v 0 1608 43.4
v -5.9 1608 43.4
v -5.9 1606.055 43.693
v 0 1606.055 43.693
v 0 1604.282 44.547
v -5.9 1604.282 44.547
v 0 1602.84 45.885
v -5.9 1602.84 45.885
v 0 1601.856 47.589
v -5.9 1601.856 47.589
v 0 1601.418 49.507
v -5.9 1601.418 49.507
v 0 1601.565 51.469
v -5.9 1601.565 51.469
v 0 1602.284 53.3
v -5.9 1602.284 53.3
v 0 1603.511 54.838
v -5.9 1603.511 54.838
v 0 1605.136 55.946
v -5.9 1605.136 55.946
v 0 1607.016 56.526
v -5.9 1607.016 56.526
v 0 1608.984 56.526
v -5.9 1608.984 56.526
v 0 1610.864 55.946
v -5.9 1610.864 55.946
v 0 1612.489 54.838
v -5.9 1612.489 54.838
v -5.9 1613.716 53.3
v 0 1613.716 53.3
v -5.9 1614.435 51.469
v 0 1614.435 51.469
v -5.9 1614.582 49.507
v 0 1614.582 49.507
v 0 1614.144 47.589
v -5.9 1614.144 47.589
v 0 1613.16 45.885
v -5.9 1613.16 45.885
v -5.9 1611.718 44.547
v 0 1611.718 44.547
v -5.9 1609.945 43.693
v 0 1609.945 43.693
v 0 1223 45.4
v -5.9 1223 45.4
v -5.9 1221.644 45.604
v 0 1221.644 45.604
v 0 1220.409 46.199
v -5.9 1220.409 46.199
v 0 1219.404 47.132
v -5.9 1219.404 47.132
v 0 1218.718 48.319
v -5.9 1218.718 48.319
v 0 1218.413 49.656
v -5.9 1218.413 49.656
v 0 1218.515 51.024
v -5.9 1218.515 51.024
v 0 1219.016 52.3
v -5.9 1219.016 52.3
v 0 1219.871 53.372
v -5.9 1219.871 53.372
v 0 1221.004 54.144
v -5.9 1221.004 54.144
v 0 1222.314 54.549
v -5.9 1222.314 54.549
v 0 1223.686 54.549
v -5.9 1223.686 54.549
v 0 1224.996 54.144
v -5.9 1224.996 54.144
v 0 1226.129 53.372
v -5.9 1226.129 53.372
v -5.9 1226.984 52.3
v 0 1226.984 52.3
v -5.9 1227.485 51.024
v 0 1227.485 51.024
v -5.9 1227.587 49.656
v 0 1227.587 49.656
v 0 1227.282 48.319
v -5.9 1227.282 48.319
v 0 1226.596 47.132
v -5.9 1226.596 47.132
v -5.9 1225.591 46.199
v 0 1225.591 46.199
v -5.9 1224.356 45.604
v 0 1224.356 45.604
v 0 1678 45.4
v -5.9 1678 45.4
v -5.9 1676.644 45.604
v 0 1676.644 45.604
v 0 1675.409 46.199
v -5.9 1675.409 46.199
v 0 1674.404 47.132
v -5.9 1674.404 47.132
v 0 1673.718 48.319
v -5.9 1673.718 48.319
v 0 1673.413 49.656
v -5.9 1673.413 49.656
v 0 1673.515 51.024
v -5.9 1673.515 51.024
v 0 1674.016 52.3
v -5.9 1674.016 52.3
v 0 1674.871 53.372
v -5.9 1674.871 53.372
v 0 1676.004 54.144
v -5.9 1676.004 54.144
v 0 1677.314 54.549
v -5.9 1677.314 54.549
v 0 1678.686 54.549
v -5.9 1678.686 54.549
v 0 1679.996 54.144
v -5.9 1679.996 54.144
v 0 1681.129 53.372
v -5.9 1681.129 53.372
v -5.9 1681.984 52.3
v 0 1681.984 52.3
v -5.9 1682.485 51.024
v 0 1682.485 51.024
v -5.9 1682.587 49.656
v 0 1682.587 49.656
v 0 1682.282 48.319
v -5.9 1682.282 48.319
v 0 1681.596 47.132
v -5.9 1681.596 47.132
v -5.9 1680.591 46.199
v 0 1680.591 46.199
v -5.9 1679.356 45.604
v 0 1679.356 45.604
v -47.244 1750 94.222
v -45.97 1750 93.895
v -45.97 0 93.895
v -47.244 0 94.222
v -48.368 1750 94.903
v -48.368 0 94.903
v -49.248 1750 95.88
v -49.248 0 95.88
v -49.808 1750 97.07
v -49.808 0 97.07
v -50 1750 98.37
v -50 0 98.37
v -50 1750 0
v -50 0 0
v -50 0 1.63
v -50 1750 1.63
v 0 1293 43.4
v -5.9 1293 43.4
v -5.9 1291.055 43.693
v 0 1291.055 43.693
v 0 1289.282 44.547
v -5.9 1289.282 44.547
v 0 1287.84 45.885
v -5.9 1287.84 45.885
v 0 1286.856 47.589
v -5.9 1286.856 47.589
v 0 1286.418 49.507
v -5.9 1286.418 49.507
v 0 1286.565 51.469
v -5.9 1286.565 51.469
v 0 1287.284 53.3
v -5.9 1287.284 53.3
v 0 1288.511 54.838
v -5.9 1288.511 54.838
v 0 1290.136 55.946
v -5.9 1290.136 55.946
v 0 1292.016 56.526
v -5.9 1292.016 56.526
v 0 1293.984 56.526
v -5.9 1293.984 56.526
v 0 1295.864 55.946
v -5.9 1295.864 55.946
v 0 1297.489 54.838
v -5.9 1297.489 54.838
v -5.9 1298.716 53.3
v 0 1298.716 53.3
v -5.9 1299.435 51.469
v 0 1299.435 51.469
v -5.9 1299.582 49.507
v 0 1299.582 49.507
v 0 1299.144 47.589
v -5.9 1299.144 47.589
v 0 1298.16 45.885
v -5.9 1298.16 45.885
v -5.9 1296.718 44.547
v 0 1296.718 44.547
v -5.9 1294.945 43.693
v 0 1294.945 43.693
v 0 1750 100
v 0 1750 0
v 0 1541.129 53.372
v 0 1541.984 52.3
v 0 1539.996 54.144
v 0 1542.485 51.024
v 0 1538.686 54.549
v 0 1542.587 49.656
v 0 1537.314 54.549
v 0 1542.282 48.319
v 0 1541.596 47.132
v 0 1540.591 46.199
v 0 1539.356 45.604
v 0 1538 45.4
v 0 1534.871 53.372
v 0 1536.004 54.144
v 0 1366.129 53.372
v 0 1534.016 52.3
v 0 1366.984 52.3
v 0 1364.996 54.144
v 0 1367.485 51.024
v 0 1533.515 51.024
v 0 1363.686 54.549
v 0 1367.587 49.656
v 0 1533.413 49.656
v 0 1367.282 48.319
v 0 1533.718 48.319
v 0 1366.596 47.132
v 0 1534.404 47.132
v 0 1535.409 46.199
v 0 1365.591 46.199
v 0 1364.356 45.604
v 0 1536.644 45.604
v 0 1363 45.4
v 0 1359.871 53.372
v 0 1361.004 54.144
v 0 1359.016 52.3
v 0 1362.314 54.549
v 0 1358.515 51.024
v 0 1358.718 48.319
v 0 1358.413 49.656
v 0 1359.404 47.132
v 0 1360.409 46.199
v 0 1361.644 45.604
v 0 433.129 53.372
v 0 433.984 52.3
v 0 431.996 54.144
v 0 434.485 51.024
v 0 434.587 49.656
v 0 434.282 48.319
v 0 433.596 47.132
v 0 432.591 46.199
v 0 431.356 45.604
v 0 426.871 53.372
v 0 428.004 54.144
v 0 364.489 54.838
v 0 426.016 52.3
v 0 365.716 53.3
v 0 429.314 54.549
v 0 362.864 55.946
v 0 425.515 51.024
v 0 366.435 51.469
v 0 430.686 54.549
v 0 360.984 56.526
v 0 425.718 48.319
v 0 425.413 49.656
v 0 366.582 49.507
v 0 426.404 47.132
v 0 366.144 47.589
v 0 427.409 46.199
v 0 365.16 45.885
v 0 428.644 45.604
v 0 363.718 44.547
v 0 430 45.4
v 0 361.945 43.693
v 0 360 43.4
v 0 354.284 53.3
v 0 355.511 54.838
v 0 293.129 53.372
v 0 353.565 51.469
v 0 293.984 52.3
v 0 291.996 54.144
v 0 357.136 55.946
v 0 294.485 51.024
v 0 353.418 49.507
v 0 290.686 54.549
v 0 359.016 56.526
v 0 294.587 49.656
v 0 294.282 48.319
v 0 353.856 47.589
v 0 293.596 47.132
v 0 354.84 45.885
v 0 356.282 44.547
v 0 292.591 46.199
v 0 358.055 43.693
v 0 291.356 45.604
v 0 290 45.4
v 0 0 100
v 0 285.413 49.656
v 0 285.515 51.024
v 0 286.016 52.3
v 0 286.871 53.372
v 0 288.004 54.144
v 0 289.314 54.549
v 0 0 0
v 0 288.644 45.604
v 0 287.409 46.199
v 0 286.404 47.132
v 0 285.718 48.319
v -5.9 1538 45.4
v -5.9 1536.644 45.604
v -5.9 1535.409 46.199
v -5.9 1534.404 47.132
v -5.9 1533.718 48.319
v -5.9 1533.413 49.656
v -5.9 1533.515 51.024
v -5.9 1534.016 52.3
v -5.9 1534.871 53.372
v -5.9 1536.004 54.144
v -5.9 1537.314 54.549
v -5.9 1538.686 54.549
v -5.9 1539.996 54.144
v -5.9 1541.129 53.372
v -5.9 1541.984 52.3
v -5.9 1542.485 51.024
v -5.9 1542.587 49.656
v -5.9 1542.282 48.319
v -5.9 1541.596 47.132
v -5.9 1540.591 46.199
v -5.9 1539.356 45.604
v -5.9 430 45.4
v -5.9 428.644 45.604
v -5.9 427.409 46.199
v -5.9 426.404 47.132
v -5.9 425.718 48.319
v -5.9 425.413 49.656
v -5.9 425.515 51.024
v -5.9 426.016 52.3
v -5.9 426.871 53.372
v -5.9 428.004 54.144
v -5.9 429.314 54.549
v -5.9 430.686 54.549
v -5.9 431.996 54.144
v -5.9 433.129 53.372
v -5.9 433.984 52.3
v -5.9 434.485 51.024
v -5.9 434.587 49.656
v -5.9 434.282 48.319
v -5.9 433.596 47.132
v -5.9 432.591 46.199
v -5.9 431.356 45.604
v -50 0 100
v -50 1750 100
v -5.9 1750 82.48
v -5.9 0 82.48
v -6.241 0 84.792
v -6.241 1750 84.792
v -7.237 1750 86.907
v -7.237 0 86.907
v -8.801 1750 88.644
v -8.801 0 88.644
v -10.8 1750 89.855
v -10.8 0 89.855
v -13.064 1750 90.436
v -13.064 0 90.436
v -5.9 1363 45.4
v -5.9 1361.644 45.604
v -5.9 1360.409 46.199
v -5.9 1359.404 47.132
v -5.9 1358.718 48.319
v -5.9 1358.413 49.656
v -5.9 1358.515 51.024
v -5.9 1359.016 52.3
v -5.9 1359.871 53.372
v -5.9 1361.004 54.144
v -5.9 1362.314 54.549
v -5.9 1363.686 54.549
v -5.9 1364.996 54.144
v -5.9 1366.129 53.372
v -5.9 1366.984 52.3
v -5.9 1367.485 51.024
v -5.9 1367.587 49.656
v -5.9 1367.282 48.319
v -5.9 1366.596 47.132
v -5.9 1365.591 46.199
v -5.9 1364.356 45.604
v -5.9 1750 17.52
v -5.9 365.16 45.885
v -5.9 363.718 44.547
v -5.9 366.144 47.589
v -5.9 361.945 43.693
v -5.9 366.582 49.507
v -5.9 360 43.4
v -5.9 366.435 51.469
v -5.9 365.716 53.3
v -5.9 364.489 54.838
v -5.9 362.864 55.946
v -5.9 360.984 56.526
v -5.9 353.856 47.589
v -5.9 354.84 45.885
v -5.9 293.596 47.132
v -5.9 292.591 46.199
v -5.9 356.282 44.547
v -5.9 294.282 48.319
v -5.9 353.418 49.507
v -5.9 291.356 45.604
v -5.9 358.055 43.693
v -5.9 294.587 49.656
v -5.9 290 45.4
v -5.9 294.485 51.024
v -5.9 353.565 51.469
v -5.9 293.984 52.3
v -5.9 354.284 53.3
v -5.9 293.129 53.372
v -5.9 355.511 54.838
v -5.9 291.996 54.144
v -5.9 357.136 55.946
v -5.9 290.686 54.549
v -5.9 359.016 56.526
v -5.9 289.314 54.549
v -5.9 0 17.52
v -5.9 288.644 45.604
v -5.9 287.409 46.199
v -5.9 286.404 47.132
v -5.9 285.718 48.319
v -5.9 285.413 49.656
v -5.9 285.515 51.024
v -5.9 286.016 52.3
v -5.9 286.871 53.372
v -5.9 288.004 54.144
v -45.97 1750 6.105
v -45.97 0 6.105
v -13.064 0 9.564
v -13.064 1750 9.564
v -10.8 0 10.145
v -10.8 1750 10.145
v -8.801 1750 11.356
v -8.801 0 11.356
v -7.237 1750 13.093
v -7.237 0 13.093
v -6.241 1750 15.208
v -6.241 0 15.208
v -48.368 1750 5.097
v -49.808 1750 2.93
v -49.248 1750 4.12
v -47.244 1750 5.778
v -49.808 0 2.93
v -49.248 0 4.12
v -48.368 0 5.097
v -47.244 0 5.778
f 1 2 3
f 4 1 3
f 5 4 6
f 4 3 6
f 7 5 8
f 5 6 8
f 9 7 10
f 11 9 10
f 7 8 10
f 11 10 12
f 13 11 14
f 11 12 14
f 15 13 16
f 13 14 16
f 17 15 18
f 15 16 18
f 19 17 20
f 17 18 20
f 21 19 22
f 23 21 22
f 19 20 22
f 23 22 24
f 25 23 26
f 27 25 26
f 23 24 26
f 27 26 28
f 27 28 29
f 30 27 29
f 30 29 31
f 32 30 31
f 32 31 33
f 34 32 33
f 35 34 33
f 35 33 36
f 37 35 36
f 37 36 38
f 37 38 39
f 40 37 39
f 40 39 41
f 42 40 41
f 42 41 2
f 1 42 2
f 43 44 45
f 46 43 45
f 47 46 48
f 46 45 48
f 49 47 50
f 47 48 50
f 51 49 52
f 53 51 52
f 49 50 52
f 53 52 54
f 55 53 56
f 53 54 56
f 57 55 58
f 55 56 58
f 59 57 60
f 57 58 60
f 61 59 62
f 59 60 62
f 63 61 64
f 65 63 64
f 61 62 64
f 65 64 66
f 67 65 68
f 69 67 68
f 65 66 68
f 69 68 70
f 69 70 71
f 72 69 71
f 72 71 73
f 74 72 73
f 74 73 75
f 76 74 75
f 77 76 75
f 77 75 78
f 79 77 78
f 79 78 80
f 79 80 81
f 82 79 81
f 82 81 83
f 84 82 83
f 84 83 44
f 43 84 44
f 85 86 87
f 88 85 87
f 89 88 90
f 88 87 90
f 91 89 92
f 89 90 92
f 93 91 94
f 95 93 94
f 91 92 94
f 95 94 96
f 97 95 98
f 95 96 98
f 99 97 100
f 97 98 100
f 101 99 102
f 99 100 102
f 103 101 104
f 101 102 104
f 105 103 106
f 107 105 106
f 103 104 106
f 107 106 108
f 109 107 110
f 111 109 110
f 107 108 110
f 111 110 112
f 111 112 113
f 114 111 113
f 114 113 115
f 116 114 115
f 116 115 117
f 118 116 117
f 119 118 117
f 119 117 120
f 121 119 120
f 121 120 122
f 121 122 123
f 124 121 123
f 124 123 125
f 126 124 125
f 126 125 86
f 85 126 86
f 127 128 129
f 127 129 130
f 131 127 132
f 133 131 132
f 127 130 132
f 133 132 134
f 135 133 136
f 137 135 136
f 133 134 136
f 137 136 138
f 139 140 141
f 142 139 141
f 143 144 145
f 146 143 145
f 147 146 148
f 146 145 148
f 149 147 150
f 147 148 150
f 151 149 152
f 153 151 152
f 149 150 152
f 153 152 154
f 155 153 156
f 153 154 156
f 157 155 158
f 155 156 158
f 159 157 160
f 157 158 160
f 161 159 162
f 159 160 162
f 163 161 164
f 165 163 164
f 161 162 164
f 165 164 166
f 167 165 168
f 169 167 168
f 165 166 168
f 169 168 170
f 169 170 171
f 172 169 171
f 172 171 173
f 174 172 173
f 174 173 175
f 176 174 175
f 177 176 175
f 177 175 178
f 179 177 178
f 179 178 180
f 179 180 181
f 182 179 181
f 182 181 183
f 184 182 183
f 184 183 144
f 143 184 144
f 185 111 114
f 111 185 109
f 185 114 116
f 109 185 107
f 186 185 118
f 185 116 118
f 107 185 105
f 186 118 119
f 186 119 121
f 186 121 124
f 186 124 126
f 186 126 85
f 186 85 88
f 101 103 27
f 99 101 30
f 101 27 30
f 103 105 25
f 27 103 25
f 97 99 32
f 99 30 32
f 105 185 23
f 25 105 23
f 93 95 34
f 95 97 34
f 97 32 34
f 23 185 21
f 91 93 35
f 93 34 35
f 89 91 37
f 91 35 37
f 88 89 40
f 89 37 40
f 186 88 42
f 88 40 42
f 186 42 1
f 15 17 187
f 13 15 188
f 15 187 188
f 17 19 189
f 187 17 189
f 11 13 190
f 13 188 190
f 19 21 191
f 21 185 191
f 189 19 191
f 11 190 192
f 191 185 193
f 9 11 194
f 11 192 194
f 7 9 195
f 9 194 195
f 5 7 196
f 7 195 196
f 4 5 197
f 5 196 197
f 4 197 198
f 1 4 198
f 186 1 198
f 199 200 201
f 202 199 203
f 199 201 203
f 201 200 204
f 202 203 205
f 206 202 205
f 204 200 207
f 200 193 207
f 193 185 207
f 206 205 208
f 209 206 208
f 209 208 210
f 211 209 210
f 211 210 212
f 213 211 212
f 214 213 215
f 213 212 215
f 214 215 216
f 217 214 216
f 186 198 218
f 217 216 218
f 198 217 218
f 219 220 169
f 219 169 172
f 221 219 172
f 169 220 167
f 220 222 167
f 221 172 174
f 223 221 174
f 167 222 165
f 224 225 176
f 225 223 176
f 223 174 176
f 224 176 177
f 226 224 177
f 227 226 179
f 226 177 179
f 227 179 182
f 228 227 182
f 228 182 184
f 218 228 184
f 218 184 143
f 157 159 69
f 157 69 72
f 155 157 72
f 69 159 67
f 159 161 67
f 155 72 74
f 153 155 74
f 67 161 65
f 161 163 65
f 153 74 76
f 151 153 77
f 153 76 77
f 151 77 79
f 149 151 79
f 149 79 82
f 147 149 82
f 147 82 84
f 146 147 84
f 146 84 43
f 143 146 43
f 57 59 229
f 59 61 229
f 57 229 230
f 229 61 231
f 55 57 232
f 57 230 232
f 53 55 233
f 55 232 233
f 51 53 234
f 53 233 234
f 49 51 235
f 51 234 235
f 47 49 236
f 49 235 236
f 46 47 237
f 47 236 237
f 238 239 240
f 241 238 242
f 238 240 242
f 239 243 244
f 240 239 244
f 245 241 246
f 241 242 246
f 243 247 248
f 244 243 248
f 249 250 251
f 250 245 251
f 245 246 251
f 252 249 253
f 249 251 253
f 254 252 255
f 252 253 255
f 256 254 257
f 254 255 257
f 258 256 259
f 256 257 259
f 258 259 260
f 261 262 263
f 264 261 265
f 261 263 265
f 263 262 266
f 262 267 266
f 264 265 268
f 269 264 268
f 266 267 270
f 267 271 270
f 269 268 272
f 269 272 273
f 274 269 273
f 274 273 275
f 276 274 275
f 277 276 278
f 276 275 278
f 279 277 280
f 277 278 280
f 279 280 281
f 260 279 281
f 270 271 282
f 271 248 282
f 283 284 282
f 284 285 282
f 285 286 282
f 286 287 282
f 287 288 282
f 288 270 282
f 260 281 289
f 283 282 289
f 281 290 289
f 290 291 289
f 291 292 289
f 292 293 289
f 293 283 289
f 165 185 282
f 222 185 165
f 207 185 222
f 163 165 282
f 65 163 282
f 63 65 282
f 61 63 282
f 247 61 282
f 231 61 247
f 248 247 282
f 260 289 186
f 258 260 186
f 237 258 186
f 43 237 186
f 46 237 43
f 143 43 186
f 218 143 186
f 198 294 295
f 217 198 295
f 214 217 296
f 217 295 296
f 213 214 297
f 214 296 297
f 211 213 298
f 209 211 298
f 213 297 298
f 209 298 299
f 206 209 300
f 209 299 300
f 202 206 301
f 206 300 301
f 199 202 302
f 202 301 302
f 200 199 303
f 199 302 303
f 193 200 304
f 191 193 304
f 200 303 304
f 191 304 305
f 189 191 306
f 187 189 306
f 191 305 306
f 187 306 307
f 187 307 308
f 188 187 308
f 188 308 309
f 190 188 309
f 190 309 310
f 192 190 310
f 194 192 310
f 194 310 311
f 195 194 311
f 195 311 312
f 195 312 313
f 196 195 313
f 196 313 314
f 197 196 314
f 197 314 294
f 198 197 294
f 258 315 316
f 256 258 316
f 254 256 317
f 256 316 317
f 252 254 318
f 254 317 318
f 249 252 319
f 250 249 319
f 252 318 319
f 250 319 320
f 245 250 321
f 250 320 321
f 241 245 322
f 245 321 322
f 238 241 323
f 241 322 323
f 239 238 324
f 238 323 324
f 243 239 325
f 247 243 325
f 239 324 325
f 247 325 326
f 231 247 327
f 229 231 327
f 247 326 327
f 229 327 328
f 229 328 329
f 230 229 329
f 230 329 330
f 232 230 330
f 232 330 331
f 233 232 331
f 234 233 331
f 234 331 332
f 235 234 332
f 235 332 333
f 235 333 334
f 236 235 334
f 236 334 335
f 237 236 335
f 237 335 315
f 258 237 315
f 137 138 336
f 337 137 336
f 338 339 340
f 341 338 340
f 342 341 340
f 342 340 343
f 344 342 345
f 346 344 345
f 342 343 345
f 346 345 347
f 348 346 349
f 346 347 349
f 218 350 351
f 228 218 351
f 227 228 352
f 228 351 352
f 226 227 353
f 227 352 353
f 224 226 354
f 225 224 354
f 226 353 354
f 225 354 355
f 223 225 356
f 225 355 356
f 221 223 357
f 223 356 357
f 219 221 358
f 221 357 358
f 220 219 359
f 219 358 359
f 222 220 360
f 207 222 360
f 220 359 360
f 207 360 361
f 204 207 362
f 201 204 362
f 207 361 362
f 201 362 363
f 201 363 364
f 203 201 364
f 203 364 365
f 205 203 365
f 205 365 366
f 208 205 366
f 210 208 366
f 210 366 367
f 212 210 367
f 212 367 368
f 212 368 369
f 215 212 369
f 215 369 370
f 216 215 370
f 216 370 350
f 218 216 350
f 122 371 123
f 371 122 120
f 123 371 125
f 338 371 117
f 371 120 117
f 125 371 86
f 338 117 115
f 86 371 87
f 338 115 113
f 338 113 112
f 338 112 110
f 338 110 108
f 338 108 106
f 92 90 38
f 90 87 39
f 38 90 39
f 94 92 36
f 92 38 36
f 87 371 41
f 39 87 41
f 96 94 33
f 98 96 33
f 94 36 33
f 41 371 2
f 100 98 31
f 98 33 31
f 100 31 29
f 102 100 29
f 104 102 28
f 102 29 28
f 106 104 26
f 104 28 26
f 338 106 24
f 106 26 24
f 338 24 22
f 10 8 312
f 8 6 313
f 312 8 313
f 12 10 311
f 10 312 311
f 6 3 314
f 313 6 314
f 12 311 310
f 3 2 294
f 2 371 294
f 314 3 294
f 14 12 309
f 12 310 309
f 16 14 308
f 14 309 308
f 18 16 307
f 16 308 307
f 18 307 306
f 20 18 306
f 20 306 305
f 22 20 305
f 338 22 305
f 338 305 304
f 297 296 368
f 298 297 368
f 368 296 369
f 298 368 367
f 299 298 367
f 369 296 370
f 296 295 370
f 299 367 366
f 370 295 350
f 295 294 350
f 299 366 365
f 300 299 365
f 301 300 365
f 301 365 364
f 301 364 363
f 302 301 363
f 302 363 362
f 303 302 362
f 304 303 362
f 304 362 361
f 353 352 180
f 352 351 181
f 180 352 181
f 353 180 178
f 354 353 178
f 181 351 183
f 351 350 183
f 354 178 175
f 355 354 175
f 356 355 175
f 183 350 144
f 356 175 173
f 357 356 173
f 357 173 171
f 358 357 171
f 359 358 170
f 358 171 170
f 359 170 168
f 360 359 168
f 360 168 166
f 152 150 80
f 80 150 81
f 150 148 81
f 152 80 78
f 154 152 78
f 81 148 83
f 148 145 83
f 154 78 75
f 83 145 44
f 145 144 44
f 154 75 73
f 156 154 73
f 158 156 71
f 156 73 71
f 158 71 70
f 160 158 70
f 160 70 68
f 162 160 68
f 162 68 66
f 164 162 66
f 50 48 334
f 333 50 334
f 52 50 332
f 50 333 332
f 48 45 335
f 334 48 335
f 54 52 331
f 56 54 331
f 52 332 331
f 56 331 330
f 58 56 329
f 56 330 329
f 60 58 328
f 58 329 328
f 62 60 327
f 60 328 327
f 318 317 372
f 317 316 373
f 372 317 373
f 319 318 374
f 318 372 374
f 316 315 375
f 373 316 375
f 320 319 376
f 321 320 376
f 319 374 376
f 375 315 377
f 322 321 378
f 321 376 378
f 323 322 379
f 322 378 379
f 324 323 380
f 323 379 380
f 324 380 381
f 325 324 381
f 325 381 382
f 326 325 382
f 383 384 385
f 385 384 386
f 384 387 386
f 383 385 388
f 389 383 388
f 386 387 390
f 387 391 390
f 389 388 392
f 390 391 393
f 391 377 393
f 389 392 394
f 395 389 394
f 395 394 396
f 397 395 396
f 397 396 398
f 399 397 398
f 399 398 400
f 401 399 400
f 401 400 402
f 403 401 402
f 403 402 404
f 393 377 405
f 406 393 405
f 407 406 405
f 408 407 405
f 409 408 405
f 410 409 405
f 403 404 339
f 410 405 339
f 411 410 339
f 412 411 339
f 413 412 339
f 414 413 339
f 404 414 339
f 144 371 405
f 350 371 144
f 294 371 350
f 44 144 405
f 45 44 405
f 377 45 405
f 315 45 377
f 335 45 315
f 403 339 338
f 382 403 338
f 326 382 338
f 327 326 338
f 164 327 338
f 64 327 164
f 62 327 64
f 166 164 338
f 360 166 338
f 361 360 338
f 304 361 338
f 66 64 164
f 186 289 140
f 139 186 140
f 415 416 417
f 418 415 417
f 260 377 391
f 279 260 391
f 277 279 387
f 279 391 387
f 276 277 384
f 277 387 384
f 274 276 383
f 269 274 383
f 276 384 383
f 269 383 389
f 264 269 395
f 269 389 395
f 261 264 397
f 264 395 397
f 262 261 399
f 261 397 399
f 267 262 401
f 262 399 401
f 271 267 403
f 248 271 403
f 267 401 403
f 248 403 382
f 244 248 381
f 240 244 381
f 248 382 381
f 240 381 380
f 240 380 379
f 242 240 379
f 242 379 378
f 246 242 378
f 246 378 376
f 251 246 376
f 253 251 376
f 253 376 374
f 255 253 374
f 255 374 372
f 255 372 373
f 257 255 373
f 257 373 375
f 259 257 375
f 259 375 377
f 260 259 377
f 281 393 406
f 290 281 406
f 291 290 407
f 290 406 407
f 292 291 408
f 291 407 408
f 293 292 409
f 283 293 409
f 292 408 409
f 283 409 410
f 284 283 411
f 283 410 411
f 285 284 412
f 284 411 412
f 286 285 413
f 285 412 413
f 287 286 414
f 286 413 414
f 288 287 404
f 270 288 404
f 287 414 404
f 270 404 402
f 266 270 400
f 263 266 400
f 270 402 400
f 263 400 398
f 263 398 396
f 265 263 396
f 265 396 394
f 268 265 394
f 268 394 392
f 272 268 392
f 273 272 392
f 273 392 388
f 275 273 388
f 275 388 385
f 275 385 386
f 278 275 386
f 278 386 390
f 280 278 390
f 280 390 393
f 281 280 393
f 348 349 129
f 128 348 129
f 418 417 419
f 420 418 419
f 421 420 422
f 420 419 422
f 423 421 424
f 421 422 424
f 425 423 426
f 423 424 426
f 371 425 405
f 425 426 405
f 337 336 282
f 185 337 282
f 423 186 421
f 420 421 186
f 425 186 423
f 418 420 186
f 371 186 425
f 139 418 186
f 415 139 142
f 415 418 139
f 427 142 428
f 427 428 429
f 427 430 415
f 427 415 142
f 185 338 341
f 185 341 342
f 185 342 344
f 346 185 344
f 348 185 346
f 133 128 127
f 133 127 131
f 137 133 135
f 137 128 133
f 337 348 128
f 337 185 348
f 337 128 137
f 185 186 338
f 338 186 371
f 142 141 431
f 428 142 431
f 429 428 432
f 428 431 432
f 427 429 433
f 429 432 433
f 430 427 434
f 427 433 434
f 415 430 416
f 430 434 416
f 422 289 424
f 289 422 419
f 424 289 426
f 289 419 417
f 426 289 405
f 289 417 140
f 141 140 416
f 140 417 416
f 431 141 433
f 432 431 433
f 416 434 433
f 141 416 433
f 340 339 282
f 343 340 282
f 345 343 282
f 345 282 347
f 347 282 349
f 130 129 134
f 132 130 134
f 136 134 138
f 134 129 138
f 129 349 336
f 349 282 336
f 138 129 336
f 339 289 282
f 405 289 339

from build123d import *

# Parameters (mm, degrees)
CEOWNIK_C_100_X_10_1_DEPTH = 1750
OTW_R_13_2_13_2_1_D        = 13.2
OTW_R_13_2_13_2_1_DEPTH    = 51.034319914
OTW_R_13_2_13_2_1_TIP      = 3.965680086
OTW_R_9_2_9_2_1_D          = 9.2
OTW_R_9_2_9_2_1_DEPTH      = 52.236041152
OTW_R_9_2_9_2_1_TIP        = 2.763958848


with BuildPart() as part:
    # Sketch1 → Ceownik c 100 X 10(1) (new body)
    with BuildSketch(Plane(origin=(0, 0, 0), x_dir=(-1, 0, 0), z_dir=(0, 1, 0))):
        with BuildLine():
            Line((50, 100), (0, 100))
            Line((0, 100), (0, 0))
            Line((0, 0), (50, 0))
            Line((50, 0), (50, 1.629852671))
            ThreePointArc((50, 1.629852671), (48.844151715, 4.6409404), (45.970378085, 6.1052012))
            Line((45.970378085, 6.1052012), (13.063772294, 9.563824837))
            ThreePointArc((13.063772294, 9.563824837), (7.954841396, 12.166955149), (5.9, 17.52))
            Line((5.9, 17.52), (5.9, 82.48))
            ThreePointArc((5.9, 82.48), (7.954841396, 87.833044851), (13.063772294, 90.436175163))
            Line((13.063772294, 90.436175163), (45.970378085, 93.8947988))
            ThreePointArc((45.970378085, 93.8947988), (48.844151715, 95.3590596), (50, 98.370147329))
            Line((50, 98.370147329), (50, 100))
        make_face()
    extrude(amount=CEOWNIK_C_100_X_10_1_DEPTH)

    # Otwór Ø13.2 (13.2)1
    with Locations(Plane(origin=(0, 1608, 50), x_dir=(0, 0, 1), z_dir=(1, 0, 0))):
        with Locations((0, 0), (0, 315), (0, 1248)):
            Hole(OTW_R_13_2_13_2_1_D / 2, depth=OTW_R_13_2_13_2_1_DEPTH)
            with Locations((0, 0, -(OTW_R_13_2_13_2_1_DEPTH + OTW_R_13_2_13_2_1_TIP / 2))):  # 118° drill point
                Cone(0, OTW_R_13_2_13_2_1_D / 2, OTW_R_13_2_13_2_1_TIP, mode=Mode.SUBTRACT)

    # Otwór Ø9.2 (9.2)1
    with Locations(Plane(origin=(0, 1538, 50), x_dir=(0, 0, 1), z_dir=(1, 0, 0))):
        with Locations((0, 0), (0, -140), (0, 175), (0, 315), (0, 1108), (0, 1248)):
            Hole(OTW_R_9_2_9_2_1_D / 2, depth=OTW_R_9_2_9_2_1_DEPTH)
            with Locations((0, 0, -(OTW_R_9_2_9_2_1_DEPTH + OTW_R_9_2_9_2_1_TIP / 2))):  # 118° drill point
                Cone(0, OTW_R_9_2_9_2_1_D / 2, OTW_R_9_2_9_2_1_TIP, mode=Mode.SUBTRACT)


solid = part.part
